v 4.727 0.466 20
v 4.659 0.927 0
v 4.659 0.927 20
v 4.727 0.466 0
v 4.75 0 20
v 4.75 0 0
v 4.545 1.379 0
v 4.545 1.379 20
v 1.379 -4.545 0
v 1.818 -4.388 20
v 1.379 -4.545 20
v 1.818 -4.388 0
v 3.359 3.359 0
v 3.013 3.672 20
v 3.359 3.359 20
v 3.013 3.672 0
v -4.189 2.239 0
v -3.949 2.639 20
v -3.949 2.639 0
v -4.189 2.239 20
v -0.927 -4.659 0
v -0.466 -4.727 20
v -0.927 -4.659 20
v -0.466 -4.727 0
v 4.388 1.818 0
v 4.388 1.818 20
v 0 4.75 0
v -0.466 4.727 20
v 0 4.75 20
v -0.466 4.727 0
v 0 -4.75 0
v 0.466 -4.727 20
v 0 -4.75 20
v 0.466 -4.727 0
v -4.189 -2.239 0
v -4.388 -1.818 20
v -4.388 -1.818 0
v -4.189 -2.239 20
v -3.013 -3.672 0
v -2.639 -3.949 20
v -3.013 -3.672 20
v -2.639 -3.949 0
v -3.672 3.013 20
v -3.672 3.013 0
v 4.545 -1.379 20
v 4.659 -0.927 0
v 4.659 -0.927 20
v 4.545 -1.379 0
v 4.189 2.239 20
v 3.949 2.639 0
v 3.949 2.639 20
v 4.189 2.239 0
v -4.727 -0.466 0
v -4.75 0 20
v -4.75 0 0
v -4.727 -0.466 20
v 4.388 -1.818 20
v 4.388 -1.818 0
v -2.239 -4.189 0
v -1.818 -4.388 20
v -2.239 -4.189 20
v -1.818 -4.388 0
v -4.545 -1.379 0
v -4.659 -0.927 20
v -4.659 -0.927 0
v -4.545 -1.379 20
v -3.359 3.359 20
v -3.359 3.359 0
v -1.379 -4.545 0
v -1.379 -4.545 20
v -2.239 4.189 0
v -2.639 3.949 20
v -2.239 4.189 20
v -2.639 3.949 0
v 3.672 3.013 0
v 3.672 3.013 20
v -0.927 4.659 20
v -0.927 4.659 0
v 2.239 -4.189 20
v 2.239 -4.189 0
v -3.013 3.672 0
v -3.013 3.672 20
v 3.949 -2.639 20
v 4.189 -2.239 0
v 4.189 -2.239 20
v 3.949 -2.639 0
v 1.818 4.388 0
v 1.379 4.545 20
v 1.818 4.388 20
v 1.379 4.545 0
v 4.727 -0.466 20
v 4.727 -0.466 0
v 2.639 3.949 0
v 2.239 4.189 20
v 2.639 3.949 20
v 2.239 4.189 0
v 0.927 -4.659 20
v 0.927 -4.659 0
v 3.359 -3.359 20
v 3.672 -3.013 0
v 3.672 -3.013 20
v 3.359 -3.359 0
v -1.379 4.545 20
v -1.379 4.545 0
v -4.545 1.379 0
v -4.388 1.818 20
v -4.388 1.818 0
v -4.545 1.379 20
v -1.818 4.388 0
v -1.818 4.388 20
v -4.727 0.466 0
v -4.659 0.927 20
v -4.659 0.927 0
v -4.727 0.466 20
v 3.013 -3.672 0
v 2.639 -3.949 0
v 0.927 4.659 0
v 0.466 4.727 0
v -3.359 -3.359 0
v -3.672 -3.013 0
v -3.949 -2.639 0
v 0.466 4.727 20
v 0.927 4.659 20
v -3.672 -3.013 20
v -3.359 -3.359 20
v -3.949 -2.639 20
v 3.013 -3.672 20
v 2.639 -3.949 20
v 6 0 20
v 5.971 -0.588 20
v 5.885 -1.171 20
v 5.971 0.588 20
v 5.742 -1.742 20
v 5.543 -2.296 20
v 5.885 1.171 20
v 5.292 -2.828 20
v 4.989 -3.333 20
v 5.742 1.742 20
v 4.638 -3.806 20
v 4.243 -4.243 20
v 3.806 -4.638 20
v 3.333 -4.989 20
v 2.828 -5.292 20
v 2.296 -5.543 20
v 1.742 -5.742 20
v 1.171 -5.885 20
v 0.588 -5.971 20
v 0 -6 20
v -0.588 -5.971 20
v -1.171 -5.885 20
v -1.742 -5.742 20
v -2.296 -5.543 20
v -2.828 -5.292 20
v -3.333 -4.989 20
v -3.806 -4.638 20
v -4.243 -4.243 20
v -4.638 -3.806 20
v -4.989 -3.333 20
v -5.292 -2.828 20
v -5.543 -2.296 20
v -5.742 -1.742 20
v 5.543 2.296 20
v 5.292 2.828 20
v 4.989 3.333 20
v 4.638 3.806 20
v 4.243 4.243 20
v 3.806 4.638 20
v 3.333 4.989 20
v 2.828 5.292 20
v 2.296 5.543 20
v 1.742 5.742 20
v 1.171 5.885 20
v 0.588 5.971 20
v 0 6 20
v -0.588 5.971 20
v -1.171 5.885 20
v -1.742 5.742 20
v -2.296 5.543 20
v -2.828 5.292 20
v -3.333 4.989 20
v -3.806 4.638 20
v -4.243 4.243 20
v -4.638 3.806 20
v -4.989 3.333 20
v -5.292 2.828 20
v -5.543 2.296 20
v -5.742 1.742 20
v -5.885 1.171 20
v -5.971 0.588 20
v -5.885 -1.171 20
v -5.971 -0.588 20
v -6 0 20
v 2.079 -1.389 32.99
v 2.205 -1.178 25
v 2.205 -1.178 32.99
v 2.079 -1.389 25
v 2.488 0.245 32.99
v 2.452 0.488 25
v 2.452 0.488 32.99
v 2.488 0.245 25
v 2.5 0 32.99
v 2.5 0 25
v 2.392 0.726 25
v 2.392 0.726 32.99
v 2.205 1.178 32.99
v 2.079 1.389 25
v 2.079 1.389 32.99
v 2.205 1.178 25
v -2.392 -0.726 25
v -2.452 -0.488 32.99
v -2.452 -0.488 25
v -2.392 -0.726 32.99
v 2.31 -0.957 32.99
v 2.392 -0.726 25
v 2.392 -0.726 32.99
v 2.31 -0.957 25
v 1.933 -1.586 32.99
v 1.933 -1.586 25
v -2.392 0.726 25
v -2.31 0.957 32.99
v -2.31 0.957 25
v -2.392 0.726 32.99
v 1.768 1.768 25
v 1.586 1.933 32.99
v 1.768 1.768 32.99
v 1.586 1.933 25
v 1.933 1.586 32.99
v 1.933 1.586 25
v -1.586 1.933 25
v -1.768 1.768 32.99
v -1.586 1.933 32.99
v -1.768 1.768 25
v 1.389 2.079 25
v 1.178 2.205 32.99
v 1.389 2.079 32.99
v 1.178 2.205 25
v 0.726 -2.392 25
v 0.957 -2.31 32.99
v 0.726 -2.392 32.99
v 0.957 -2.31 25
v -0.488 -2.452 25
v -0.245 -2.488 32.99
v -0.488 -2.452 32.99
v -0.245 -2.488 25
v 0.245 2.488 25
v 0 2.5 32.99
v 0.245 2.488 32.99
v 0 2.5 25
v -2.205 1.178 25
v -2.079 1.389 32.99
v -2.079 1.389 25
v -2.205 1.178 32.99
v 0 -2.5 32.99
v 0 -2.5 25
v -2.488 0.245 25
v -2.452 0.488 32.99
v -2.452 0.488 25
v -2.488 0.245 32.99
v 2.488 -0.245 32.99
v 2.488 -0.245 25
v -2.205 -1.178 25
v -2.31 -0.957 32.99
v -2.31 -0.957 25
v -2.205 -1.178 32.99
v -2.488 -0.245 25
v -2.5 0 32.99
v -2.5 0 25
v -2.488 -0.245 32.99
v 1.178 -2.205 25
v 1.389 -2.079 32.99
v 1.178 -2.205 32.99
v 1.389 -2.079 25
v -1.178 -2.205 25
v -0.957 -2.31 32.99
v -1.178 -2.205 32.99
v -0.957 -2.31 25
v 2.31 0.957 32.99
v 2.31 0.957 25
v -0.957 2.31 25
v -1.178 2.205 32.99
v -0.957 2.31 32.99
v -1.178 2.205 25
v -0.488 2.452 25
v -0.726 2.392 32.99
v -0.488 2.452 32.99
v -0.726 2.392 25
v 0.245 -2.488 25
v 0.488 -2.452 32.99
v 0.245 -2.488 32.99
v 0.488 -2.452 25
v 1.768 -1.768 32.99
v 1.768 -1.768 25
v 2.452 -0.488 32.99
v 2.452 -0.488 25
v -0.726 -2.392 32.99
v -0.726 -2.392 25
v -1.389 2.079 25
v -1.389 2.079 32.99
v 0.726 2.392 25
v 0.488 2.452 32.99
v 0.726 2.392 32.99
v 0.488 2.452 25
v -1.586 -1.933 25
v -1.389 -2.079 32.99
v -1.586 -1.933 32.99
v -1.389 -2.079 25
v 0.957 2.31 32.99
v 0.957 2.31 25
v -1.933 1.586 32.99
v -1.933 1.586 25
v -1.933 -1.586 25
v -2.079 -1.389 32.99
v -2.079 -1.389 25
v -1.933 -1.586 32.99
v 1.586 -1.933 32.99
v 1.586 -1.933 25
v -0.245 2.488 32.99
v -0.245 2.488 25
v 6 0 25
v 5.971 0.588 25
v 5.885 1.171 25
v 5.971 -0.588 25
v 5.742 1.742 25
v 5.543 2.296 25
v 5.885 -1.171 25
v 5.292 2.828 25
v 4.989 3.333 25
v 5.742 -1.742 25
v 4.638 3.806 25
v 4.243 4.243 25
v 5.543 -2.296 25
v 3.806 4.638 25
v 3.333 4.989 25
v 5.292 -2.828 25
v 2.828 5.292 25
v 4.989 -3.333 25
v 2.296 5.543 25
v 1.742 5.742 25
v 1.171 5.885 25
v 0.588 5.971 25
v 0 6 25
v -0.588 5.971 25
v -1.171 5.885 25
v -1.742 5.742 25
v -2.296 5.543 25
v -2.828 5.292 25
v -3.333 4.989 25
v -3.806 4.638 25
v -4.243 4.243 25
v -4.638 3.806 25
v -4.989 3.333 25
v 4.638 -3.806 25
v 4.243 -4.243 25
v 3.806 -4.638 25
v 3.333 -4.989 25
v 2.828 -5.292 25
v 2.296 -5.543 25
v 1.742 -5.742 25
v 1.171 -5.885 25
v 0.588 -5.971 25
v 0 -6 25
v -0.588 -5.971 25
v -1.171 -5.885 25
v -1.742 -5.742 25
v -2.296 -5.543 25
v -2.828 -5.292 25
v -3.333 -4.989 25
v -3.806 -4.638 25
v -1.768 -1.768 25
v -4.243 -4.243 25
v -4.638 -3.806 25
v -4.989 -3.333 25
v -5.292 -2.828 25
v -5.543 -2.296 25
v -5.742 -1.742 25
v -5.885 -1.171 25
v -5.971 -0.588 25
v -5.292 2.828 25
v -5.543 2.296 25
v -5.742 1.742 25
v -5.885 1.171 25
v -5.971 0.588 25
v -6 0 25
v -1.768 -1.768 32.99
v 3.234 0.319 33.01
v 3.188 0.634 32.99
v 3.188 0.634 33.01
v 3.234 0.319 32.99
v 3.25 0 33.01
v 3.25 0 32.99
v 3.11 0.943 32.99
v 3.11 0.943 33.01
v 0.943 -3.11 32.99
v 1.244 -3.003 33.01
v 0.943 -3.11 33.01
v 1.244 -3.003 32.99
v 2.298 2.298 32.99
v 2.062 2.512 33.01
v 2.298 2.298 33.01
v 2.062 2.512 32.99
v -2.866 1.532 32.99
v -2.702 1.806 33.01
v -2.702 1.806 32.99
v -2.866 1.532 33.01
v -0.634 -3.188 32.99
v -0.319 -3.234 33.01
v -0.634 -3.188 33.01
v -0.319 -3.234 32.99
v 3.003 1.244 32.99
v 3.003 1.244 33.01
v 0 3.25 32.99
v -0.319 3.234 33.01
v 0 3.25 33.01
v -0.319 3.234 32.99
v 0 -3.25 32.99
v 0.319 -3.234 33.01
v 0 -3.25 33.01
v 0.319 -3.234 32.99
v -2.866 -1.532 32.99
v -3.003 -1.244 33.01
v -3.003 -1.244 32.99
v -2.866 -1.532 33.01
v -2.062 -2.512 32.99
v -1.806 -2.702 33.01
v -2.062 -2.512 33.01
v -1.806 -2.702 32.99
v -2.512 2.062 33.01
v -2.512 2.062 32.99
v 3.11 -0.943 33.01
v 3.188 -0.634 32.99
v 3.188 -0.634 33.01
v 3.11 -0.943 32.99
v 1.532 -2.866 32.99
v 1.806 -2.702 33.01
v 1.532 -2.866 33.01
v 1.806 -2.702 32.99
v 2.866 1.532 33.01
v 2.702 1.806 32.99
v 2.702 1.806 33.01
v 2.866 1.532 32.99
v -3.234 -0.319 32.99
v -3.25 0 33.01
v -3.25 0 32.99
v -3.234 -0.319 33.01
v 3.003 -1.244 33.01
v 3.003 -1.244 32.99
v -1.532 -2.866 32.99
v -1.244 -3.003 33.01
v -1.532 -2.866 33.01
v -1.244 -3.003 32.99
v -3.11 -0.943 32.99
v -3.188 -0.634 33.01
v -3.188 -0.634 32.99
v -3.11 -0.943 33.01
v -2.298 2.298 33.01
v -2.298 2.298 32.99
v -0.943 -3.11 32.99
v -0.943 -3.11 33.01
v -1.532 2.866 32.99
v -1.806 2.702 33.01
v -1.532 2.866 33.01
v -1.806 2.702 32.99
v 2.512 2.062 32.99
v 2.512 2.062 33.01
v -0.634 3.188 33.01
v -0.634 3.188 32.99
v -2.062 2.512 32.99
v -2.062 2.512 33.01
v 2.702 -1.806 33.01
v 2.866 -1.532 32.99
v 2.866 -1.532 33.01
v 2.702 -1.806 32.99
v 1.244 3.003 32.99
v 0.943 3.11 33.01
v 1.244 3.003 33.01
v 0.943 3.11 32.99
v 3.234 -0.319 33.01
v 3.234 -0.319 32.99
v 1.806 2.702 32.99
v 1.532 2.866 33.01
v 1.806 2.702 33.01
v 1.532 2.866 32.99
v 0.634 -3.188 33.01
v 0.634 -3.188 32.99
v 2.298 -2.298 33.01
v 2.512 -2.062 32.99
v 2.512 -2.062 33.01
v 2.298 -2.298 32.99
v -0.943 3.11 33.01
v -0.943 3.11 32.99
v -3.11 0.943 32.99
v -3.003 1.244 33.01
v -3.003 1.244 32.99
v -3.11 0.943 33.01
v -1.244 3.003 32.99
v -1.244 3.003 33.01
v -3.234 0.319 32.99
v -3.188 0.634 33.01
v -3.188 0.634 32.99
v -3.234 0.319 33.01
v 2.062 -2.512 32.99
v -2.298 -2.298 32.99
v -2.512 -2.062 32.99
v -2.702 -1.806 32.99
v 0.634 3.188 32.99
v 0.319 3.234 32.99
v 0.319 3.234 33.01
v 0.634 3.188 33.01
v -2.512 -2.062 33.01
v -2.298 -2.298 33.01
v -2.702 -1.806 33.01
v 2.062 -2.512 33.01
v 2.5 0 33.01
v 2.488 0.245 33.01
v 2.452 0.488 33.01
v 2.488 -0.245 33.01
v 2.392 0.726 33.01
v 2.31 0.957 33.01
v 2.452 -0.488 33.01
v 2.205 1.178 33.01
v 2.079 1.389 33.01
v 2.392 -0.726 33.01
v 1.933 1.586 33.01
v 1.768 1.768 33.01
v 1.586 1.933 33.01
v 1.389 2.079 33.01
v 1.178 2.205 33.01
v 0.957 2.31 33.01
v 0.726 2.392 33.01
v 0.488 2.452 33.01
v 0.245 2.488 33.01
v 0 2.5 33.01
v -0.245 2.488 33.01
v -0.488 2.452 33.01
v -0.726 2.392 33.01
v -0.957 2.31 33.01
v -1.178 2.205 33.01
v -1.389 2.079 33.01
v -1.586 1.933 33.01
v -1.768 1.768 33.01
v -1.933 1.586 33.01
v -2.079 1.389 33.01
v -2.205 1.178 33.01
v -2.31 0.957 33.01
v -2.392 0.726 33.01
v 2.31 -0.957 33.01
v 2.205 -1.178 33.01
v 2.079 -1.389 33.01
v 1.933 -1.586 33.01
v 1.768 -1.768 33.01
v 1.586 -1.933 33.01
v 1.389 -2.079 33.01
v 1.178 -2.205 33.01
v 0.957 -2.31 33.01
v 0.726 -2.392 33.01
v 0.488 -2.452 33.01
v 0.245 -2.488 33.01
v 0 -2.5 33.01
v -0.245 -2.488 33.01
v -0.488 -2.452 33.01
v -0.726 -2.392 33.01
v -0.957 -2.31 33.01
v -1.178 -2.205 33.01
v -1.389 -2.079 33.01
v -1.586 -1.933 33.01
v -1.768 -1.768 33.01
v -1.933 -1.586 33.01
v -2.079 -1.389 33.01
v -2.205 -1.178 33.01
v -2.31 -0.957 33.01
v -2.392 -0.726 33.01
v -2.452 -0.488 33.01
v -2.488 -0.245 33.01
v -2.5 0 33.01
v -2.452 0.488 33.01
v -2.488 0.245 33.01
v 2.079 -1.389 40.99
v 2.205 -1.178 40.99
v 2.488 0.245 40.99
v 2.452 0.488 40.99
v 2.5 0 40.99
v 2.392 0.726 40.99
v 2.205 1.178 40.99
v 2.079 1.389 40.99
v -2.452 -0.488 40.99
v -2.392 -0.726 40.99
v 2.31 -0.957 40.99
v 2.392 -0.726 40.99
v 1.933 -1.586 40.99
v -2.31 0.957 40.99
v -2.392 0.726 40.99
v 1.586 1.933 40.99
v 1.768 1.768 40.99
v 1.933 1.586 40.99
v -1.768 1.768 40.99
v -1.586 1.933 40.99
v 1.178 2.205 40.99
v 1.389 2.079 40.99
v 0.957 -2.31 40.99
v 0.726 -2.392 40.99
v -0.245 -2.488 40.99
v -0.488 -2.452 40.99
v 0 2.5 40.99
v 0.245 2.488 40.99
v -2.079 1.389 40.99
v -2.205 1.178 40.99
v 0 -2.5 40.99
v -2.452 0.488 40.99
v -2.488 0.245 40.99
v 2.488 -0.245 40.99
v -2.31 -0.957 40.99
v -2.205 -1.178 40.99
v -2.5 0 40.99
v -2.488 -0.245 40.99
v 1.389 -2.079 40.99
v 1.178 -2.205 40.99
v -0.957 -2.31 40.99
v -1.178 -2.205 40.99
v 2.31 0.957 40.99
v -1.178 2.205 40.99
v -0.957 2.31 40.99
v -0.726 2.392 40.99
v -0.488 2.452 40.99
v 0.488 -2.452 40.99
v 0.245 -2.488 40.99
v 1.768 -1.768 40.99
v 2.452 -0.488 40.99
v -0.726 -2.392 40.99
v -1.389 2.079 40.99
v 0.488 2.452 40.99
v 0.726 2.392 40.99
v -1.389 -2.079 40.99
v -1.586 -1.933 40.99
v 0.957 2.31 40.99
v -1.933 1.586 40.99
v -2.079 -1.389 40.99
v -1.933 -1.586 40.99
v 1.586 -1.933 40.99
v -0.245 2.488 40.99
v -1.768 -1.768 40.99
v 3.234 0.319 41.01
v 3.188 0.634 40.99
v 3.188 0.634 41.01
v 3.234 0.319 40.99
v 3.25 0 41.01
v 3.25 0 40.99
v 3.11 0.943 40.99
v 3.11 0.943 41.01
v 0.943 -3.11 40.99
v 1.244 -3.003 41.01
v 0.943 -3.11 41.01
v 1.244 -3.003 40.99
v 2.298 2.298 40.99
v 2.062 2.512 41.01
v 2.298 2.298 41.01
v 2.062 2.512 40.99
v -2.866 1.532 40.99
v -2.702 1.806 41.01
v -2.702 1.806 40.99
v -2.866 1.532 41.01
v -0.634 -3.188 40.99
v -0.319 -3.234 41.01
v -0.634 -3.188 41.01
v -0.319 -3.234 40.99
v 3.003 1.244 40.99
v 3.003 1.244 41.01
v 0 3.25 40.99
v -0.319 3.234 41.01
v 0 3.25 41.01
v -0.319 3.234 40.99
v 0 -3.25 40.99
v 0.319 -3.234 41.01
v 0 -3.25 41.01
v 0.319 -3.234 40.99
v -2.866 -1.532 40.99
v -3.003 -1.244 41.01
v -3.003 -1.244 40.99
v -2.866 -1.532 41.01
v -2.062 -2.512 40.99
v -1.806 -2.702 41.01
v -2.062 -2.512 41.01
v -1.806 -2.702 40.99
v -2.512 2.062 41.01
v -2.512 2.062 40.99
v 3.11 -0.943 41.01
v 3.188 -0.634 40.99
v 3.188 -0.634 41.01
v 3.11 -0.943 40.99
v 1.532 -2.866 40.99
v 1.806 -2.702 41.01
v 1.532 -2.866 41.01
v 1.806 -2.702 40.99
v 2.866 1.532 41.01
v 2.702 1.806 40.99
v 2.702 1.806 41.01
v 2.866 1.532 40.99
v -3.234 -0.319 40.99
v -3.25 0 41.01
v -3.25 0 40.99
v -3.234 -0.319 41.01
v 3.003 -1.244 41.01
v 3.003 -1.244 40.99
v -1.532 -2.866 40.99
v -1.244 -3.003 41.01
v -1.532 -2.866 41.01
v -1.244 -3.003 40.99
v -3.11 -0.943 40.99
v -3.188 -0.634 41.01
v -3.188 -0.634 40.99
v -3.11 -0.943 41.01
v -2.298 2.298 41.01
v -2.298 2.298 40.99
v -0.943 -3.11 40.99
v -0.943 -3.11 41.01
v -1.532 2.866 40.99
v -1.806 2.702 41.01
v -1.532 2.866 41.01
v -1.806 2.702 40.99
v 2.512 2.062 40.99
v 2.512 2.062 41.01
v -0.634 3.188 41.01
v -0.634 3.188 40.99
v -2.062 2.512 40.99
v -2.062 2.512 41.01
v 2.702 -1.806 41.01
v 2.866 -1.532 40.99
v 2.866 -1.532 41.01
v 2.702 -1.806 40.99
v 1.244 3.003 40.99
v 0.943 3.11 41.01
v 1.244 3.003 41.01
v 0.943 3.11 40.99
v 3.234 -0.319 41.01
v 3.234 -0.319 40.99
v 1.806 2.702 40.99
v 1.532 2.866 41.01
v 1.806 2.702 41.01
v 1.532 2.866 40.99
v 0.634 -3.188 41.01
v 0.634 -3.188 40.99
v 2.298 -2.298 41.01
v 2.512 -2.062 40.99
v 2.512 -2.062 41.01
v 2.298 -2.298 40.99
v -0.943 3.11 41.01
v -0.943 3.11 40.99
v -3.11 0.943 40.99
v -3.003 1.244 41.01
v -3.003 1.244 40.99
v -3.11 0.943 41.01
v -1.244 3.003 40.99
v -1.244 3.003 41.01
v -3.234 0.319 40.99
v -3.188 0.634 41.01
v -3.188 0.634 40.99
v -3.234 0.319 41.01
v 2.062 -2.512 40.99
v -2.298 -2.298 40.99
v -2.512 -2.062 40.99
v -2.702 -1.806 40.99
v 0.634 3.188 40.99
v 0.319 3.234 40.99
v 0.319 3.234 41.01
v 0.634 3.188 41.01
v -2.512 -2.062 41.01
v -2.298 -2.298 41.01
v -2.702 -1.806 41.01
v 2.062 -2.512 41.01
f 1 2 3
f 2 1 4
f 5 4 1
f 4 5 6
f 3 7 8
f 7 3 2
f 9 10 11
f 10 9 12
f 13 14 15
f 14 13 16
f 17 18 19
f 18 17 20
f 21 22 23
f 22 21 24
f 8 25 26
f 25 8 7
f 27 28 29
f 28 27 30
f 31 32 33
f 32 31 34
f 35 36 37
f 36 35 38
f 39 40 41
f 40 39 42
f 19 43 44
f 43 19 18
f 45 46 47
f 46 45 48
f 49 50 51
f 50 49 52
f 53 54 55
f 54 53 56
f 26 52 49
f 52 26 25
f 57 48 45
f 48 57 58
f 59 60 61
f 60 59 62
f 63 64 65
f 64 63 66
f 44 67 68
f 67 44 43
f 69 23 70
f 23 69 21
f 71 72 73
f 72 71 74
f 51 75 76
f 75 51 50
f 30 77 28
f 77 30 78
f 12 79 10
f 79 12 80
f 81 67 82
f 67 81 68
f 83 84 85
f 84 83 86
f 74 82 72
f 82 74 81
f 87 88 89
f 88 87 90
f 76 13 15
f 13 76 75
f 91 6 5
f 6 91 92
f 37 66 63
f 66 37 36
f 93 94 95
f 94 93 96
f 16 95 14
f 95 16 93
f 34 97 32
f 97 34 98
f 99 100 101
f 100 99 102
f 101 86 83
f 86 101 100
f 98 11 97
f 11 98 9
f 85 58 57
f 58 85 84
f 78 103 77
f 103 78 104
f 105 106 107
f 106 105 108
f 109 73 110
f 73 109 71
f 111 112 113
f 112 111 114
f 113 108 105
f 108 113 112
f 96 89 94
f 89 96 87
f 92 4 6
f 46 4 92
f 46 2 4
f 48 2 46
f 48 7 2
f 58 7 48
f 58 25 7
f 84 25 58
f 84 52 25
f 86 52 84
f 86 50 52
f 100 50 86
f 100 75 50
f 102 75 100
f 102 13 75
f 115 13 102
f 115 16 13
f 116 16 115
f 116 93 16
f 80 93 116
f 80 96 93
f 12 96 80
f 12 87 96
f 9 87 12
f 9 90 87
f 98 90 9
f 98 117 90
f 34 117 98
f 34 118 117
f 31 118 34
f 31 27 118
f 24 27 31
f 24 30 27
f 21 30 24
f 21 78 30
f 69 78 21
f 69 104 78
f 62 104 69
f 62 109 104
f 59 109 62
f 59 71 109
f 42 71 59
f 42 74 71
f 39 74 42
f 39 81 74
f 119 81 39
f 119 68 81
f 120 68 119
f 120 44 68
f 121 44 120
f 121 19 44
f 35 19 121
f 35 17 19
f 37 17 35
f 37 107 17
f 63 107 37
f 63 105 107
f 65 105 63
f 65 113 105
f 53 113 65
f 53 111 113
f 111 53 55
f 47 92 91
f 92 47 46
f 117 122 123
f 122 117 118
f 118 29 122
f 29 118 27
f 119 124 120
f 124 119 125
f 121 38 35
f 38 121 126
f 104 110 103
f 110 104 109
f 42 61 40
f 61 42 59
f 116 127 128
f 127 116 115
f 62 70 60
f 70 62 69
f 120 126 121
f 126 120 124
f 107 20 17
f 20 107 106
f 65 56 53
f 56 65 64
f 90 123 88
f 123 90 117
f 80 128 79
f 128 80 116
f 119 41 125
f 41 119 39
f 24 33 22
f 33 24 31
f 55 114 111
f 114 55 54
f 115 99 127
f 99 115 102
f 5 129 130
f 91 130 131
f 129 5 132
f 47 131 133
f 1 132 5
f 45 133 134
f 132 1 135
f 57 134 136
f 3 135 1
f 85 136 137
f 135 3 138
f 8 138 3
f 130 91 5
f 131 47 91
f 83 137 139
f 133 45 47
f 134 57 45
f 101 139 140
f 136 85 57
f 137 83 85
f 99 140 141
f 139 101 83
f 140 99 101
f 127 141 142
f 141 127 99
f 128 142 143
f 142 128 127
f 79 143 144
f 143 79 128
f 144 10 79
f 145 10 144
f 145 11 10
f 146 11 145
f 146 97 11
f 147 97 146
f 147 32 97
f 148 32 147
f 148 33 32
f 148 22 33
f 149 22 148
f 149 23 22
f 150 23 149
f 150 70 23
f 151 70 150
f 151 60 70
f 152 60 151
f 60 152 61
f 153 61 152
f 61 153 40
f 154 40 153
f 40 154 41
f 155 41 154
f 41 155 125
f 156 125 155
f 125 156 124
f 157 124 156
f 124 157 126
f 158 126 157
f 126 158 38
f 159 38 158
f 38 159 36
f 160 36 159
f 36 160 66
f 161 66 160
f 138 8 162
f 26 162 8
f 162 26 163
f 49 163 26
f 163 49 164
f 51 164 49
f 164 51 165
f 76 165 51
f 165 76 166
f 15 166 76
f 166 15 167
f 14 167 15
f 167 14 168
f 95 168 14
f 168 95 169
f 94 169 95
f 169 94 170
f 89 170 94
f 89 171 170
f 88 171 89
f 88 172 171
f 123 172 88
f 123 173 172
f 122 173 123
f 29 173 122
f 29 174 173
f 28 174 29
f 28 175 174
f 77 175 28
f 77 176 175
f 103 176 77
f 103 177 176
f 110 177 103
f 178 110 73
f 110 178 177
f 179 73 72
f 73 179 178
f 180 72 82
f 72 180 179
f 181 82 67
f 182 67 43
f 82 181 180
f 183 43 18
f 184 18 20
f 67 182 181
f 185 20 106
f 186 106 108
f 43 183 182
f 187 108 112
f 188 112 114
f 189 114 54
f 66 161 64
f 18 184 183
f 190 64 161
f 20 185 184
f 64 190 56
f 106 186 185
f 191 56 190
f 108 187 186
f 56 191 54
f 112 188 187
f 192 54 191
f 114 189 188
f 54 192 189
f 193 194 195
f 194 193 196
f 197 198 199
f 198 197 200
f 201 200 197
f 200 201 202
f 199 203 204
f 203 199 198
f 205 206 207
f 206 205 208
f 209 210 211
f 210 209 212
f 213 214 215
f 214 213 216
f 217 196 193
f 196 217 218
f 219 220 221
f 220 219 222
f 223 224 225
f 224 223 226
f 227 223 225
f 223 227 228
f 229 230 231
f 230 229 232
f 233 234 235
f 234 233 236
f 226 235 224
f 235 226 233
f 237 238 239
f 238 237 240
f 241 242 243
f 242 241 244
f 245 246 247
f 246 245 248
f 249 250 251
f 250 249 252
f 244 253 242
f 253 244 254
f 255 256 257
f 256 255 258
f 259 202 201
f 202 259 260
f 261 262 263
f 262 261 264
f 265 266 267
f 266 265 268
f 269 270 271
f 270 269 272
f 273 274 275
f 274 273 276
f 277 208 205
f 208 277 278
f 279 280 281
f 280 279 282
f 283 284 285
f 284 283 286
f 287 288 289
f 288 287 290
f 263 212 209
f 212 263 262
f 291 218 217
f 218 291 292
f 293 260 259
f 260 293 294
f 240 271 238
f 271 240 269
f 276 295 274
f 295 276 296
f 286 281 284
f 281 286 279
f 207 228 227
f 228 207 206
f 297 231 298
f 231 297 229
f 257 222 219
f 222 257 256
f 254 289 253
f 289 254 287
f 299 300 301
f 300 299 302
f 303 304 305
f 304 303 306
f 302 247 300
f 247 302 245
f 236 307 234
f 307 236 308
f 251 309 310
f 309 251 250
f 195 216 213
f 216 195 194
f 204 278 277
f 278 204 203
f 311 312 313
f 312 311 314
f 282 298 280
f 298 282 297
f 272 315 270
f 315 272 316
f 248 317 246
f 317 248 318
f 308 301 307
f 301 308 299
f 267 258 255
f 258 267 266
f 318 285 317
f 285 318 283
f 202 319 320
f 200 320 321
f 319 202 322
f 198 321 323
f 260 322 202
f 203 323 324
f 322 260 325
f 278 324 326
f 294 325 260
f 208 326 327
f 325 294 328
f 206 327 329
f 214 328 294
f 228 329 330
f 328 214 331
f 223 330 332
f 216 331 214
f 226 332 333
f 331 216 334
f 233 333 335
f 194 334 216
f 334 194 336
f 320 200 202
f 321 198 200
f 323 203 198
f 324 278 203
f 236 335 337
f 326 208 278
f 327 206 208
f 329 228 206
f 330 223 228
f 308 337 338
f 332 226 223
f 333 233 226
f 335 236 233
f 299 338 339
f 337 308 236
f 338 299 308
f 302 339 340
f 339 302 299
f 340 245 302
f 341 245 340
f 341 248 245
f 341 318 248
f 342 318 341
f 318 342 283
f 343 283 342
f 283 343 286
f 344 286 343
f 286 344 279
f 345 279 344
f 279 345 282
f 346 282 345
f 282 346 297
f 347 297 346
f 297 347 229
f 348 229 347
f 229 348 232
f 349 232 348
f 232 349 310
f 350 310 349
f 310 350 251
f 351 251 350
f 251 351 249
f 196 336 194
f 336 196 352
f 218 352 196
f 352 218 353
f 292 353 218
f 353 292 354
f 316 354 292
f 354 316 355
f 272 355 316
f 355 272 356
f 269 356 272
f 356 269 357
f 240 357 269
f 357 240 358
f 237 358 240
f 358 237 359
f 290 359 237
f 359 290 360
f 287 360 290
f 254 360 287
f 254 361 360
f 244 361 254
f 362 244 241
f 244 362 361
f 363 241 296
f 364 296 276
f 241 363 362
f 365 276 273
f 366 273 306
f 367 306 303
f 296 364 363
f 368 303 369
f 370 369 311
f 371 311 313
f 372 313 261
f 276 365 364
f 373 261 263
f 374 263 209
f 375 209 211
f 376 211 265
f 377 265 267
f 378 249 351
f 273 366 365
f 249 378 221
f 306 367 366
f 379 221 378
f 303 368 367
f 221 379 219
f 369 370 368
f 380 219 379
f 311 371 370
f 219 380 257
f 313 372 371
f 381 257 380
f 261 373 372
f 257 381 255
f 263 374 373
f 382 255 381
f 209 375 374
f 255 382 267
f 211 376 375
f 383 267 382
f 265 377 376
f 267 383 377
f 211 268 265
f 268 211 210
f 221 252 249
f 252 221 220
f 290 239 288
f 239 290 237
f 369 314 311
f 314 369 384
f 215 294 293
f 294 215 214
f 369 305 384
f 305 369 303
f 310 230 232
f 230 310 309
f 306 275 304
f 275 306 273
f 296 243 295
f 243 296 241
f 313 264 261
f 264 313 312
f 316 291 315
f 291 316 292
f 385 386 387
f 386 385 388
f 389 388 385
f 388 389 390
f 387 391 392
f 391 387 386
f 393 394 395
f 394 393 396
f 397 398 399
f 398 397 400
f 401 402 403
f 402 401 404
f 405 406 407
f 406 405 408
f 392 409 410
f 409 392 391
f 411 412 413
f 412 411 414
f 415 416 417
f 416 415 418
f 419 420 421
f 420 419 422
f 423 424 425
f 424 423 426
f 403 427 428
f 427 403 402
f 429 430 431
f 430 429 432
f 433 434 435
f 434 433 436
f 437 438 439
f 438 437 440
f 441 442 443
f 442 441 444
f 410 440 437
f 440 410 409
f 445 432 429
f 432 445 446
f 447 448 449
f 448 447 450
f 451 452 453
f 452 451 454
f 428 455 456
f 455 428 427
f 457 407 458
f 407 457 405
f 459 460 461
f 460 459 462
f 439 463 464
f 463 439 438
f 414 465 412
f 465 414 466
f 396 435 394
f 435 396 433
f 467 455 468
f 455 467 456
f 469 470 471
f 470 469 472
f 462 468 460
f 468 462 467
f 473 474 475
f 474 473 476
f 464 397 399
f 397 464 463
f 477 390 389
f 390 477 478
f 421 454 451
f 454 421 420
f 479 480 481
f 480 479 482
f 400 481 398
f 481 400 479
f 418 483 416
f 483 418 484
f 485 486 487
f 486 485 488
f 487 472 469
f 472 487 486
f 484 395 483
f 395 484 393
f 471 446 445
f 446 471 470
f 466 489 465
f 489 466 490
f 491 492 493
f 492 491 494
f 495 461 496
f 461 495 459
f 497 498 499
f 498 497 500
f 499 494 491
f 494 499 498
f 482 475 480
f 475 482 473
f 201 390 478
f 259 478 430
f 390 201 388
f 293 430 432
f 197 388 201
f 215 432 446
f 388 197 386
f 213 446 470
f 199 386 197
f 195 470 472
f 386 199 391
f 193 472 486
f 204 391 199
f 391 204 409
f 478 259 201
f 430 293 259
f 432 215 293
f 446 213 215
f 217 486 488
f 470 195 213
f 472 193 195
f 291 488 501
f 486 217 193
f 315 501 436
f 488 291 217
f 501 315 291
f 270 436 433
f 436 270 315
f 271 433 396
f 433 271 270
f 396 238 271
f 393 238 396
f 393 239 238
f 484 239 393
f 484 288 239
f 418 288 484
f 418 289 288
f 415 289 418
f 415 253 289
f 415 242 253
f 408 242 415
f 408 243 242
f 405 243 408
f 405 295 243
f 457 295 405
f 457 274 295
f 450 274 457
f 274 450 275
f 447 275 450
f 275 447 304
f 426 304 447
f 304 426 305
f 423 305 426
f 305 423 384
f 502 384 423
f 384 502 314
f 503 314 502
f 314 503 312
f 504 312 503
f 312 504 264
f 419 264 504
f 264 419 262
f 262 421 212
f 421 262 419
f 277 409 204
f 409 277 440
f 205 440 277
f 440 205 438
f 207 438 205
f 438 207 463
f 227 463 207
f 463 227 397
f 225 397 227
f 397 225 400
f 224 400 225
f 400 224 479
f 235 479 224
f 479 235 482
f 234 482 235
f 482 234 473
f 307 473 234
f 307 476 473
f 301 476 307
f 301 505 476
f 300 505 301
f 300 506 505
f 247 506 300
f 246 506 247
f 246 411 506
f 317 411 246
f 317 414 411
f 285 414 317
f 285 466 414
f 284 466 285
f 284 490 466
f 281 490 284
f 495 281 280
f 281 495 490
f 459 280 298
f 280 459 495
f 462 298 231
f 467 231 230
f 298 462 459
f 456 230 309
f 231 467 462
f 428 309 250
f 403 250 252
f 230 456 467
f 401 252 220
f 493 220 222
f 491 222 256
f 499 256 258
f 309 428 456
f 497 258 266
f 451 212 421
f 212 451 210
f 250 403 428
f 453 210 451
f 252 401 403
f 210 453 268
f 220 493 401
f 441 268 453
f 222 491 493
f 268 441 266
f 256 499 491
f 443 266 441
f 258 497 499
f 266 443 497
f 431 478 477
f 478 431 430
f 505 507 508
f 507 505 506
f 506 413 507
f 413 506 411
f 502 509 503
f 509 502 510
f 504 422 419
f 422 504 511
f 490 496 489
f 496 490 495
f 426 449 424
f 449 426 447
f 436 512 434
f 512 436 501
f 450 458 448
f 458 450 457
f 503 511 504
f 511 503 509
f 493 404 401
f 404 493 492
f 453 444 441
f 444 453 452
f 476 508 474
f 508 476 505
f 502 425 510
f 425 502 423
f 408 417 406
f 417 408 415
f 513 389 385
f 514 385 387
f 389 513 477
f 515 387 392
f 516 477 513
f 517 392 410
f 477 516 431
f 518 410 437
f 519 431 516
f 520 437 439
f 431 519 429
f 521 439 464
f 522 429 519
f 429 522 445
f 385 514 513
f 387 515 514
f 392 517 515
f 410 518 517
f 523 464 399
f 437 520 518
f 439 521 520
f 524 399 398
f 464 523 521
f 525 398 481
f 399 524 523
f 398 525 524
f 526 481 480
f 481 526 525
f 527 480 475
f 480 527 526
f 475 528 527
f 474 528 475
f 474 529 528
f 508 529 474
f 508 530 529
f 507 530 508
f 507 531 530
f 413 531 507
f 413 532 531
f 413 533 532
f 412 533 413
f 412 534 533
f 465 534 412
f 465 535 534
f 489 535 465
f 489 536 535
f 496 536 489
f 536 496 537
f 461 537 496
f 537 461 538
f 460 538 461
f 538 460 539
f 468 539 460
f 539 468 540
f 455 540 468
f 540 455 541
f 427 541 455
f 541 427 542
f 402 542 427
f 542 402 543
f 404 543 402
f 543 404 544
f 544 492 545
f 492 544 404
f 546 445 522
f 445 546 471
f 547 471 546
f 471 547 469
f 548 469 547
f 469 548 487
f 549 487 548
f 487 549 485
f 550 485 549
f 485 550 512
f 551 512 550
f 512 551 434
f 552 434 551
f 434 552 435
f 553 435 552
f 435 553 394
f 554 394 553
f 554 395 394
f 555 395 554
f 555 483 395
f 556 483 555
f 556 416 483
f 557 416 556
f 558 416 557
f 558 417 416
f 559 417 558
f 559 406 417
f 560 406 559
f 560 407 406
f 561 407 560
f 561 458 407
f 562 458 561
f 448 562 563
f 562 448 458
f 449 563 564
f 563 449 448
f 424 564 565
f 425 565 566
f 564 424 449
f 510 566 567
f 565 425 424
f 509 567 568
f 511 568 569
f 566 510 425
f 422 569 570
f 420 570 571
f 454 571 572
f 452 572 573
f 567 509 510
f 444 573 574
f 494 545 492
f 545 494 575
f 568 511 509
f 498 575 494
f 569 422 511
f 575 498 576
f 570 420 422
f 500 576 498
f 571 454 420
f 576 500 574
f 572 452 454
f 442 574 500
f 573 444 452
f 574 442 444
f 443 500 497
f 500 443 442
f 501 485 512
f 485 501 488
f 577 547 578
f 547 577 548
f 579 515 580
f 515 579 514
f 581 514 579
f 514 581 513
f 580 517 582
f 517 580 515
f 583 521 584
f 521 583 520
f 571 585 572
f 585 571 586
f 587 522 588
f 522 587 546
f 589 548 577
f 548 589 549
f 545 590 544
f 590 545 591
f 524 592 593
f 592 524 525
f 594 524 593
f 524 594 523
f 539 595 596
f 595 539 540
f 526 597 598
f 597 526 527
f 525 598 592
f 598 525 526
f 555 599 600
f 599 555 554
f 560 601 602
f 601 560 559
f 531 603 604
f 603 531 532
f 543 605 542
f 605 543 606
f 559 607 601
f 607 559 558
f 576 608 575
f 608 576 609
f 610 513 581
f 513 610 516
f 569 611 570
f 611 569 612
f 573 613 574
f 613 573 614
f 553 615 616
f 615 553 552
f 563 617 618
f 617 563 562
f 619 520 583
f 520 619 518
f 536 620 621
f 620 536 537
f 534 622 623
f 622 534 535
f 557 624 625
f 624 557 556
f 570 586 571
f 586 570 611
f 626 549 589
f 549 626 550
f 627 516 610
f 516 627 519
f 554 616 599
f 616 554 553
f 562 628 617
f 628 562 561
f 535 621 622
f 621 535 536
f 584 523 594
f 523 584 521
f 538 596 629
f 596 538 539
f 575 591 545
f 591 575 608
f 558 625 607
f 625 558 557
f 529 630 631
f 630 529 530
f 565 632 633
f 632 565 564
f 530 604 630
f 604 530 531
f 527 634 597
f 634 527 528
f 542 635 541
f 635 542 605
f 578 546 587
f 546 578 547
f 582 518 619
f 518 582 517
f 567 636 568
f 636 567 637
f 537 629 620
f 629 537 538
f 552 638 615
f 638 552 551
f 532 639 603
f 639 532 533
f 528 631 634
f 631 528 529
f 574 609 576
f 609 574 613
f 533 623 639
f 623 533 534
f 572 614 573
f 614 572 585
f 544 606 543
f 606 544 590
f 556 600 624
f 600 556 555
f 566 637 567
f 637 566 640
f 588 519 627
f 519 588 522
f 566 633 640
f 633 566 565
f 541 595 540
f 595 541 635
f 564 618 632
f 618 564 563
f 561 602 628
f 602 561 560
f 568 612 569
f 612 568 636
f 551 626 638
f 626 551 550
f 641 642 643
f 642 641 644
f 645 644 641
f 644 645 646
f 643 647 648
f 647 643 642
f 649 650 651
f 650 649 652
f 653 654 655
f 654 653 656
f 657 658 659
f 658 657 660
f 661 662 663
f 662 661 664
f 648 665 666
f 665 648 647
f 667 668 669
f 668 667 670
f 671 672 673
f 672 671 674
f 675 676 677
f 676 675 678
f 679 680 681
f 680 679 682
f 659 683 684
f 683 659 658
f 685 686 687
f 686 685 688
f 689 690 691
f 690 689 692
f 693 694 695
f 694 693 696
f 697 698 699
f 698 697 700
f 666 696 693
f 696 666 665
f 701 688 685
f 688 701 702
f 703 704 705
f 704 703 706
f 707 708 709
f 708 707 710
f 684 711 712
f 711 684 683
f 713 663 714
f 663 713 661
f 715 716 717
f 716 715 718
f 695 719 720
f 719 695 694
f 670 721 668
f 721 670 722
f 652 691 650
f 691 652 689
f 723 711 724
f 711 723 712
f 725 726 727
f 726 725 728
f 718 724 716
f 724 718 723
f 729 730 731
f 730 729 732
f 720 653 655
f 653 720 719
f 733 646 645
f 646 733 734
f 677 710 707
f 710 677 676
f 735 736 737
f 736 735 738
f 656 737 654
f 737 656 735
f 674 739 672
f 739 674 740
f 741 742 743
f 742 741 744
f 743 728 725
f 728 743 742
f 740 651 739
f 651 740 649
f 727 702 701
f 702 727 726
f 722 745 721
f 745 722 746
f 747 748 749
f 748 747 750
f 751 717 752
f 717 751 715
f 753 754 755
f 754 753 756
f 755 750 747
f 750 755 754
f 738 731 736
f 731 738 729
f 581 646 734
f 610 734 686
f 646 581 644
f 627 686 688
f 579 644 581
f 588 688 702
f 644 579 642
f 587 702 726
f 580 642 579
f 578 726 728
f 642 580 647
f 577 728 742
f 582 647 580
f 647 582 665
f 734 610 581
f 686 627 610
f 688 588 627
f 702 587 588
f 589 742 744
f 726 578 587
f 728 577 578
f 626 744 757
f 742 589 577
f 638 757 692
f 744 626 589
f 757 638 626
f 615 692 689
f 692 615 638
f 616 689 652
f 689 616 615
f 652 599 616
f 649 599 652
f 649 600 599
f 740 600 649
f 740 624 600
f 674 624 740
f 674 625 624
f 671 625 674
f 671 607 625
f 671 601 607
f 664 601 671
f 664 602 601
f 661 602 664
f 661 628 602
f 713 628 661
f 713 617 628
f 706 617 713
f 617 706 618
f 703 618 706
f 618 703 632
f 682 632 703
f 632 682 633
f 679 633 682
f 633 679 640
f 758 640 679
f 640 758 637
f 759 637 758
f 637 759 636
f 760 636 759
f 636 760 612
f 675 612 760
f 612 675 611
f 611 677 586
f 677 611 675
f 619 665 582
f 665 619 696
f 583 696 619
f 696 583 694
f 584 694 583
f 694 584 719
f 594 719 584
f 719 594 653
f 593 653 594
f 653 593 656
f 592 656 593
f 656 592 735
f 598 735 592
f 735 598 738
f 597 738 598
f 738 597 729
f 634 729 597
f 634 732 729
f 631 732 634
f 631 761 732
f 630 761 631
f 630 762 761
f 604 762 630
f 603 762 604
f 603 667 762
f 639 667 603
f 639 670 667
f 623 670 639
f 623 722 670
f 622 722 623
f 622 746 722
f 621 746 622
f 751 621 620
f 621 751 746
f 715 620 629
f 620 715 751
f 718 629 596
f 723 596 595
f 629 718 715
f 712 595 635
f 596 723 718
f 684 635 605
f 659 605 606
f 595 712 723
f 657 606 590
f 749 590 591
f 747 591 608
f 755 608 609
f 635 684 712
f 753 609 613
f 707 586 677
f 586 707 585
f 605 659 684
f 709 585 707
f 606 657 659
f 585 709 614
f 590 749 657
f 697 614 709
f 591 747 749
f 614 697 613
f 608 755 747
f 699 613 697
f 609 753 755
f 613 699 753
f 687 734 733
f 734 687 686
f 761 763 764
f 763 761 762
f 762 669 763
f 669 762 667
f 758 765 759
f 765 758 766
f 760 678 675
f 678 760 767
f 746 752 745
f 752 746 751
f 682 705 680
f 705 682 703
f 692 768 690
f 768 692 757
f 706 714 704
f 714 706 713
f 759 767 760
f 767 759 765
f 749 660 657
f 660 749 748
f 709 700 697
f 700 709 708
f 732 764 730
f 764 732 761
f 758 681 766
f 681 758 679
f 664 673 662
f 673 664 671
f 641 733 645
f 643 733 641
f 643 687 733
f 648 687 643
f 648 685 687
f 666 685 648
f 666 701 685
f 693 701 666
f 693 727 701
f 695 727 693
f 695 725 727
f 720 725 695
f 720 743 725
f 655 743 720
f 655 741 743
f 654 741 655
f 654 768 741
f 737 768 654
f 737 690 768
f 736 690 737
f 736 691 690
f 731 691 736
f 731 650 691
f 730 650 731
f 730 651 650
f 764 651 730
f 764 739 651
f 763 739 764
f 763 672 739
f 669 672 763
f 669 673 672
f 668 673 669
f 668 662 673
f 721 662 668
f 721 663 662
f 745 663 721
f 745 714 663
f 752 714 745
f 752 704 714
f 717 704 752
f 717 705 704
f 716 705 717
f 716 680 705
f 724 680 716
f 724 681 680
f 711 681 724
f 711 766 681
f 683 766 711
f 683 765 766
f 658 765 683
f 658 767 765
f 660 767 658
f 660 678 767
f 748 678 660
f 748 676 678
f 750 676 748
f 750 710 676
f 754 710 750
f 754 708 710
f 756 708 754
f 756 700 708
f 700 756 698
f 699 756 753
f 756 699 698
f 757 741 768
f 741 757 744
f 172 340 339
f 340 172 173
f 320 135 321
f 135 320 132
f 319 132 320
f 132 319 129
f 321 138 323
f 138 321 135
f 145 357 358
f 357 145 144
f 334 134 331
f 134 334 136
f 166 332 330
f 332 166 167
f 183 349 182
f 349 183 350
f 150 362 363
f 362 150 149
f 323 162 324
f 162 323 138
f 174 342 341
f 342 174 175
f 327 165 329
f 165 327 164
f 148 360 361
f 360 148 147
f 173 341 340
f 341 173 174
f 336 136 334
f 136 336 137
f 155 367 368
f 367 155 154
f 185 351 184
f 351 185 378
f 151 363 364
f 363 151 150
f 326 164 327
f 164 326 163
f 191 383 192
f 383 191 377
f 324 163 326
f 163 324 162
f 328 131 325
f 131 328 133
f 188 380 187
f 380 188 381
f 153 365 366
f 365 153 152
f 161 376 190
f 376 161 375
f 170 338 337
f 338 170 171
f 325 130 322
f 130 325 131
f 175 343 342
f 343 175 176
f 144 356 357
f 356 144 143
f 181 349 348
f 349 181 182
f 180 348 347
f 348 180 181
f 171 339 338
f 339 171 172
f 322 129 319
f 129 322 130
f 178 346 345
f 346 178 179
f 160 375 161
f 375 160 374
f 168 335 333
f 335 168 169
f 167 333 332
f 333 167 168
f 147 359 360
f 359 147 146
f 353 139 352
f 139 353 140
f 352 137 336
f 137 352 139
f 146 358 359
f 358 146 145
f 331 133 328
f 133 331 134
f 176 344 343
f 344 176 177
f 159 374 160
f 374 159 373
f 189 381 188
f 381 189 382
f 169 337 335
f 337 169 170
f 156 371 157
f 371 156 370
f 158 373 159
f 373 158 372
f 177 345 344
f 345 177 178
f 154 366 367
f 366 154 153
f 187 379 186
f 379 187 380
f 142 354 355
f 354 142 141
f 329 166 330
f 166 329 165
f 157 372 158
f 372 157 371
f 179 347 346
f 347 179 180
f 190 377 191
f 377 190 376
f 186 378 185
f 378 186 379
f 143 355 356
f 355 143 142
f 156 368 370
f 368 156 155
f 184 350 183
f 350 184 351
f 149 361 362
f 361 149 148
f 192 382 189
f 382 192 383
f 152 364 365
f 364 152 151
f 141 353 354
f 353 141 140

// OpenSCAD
// Hose-barb reducer
// Dimensions in mm

// Overall dimensions
total_length = 41;
barb_height_8mm = 10;
collar_diameter = 12;
barb_height_5mm = 8;
barb_length_8mm = 20;
barb_length_5mm = 25;

// Barbs
barb_outer_diameter_bottom_8mm = 7.5;
barb_outer_diameter_top_8mm = 9.5;
barb_outer_diameter_bottom_5mm = 6.5;
barb_outer_diameter_top_5mm = 5.0;

// Central bore
bore_diameter = 3;

// Make the part
union() {
    // 8mm barbs
    for (z_offset = [0, 10]) {
        translate([0, 0, z_offset]) {
            // Barbs with sawtooth profile
            union() {
                // Main barb body
                cylinder(h = 10, d = 9.5, center = false, $fn = 64);
                // Step back to smaller diameter
                translate([0, 0, 9.99]) {
                    cylinder(h = 0.02, d = 7.5, center = false, $fn = 64);
                }
            }
        }
    }

    // Collar
    translate([0, 0, 20]) {
        cylinder(h = 5, d = 12, center = false, $fn = 64);
    }

    // 5mm barbs
    for (z_offset = [25, 33]) {
        translate([0, 0, z_offset]) {
            // Barbs with sawtooth profile
            union() {
                // Main barb body
                cylinder(h = 8, d = 5.0, center = false, $fn = 64);
                // Step back to larger diameter
                translate([0, 0, 7.99]) {
                    cylinder(h = 0.02, d = 6.5, center = false, $fn = 64);
                }
            }
        }
    }

    // Central bore
    cylinder(h = 41, d = 3, center = false, $fn = 64);
}
